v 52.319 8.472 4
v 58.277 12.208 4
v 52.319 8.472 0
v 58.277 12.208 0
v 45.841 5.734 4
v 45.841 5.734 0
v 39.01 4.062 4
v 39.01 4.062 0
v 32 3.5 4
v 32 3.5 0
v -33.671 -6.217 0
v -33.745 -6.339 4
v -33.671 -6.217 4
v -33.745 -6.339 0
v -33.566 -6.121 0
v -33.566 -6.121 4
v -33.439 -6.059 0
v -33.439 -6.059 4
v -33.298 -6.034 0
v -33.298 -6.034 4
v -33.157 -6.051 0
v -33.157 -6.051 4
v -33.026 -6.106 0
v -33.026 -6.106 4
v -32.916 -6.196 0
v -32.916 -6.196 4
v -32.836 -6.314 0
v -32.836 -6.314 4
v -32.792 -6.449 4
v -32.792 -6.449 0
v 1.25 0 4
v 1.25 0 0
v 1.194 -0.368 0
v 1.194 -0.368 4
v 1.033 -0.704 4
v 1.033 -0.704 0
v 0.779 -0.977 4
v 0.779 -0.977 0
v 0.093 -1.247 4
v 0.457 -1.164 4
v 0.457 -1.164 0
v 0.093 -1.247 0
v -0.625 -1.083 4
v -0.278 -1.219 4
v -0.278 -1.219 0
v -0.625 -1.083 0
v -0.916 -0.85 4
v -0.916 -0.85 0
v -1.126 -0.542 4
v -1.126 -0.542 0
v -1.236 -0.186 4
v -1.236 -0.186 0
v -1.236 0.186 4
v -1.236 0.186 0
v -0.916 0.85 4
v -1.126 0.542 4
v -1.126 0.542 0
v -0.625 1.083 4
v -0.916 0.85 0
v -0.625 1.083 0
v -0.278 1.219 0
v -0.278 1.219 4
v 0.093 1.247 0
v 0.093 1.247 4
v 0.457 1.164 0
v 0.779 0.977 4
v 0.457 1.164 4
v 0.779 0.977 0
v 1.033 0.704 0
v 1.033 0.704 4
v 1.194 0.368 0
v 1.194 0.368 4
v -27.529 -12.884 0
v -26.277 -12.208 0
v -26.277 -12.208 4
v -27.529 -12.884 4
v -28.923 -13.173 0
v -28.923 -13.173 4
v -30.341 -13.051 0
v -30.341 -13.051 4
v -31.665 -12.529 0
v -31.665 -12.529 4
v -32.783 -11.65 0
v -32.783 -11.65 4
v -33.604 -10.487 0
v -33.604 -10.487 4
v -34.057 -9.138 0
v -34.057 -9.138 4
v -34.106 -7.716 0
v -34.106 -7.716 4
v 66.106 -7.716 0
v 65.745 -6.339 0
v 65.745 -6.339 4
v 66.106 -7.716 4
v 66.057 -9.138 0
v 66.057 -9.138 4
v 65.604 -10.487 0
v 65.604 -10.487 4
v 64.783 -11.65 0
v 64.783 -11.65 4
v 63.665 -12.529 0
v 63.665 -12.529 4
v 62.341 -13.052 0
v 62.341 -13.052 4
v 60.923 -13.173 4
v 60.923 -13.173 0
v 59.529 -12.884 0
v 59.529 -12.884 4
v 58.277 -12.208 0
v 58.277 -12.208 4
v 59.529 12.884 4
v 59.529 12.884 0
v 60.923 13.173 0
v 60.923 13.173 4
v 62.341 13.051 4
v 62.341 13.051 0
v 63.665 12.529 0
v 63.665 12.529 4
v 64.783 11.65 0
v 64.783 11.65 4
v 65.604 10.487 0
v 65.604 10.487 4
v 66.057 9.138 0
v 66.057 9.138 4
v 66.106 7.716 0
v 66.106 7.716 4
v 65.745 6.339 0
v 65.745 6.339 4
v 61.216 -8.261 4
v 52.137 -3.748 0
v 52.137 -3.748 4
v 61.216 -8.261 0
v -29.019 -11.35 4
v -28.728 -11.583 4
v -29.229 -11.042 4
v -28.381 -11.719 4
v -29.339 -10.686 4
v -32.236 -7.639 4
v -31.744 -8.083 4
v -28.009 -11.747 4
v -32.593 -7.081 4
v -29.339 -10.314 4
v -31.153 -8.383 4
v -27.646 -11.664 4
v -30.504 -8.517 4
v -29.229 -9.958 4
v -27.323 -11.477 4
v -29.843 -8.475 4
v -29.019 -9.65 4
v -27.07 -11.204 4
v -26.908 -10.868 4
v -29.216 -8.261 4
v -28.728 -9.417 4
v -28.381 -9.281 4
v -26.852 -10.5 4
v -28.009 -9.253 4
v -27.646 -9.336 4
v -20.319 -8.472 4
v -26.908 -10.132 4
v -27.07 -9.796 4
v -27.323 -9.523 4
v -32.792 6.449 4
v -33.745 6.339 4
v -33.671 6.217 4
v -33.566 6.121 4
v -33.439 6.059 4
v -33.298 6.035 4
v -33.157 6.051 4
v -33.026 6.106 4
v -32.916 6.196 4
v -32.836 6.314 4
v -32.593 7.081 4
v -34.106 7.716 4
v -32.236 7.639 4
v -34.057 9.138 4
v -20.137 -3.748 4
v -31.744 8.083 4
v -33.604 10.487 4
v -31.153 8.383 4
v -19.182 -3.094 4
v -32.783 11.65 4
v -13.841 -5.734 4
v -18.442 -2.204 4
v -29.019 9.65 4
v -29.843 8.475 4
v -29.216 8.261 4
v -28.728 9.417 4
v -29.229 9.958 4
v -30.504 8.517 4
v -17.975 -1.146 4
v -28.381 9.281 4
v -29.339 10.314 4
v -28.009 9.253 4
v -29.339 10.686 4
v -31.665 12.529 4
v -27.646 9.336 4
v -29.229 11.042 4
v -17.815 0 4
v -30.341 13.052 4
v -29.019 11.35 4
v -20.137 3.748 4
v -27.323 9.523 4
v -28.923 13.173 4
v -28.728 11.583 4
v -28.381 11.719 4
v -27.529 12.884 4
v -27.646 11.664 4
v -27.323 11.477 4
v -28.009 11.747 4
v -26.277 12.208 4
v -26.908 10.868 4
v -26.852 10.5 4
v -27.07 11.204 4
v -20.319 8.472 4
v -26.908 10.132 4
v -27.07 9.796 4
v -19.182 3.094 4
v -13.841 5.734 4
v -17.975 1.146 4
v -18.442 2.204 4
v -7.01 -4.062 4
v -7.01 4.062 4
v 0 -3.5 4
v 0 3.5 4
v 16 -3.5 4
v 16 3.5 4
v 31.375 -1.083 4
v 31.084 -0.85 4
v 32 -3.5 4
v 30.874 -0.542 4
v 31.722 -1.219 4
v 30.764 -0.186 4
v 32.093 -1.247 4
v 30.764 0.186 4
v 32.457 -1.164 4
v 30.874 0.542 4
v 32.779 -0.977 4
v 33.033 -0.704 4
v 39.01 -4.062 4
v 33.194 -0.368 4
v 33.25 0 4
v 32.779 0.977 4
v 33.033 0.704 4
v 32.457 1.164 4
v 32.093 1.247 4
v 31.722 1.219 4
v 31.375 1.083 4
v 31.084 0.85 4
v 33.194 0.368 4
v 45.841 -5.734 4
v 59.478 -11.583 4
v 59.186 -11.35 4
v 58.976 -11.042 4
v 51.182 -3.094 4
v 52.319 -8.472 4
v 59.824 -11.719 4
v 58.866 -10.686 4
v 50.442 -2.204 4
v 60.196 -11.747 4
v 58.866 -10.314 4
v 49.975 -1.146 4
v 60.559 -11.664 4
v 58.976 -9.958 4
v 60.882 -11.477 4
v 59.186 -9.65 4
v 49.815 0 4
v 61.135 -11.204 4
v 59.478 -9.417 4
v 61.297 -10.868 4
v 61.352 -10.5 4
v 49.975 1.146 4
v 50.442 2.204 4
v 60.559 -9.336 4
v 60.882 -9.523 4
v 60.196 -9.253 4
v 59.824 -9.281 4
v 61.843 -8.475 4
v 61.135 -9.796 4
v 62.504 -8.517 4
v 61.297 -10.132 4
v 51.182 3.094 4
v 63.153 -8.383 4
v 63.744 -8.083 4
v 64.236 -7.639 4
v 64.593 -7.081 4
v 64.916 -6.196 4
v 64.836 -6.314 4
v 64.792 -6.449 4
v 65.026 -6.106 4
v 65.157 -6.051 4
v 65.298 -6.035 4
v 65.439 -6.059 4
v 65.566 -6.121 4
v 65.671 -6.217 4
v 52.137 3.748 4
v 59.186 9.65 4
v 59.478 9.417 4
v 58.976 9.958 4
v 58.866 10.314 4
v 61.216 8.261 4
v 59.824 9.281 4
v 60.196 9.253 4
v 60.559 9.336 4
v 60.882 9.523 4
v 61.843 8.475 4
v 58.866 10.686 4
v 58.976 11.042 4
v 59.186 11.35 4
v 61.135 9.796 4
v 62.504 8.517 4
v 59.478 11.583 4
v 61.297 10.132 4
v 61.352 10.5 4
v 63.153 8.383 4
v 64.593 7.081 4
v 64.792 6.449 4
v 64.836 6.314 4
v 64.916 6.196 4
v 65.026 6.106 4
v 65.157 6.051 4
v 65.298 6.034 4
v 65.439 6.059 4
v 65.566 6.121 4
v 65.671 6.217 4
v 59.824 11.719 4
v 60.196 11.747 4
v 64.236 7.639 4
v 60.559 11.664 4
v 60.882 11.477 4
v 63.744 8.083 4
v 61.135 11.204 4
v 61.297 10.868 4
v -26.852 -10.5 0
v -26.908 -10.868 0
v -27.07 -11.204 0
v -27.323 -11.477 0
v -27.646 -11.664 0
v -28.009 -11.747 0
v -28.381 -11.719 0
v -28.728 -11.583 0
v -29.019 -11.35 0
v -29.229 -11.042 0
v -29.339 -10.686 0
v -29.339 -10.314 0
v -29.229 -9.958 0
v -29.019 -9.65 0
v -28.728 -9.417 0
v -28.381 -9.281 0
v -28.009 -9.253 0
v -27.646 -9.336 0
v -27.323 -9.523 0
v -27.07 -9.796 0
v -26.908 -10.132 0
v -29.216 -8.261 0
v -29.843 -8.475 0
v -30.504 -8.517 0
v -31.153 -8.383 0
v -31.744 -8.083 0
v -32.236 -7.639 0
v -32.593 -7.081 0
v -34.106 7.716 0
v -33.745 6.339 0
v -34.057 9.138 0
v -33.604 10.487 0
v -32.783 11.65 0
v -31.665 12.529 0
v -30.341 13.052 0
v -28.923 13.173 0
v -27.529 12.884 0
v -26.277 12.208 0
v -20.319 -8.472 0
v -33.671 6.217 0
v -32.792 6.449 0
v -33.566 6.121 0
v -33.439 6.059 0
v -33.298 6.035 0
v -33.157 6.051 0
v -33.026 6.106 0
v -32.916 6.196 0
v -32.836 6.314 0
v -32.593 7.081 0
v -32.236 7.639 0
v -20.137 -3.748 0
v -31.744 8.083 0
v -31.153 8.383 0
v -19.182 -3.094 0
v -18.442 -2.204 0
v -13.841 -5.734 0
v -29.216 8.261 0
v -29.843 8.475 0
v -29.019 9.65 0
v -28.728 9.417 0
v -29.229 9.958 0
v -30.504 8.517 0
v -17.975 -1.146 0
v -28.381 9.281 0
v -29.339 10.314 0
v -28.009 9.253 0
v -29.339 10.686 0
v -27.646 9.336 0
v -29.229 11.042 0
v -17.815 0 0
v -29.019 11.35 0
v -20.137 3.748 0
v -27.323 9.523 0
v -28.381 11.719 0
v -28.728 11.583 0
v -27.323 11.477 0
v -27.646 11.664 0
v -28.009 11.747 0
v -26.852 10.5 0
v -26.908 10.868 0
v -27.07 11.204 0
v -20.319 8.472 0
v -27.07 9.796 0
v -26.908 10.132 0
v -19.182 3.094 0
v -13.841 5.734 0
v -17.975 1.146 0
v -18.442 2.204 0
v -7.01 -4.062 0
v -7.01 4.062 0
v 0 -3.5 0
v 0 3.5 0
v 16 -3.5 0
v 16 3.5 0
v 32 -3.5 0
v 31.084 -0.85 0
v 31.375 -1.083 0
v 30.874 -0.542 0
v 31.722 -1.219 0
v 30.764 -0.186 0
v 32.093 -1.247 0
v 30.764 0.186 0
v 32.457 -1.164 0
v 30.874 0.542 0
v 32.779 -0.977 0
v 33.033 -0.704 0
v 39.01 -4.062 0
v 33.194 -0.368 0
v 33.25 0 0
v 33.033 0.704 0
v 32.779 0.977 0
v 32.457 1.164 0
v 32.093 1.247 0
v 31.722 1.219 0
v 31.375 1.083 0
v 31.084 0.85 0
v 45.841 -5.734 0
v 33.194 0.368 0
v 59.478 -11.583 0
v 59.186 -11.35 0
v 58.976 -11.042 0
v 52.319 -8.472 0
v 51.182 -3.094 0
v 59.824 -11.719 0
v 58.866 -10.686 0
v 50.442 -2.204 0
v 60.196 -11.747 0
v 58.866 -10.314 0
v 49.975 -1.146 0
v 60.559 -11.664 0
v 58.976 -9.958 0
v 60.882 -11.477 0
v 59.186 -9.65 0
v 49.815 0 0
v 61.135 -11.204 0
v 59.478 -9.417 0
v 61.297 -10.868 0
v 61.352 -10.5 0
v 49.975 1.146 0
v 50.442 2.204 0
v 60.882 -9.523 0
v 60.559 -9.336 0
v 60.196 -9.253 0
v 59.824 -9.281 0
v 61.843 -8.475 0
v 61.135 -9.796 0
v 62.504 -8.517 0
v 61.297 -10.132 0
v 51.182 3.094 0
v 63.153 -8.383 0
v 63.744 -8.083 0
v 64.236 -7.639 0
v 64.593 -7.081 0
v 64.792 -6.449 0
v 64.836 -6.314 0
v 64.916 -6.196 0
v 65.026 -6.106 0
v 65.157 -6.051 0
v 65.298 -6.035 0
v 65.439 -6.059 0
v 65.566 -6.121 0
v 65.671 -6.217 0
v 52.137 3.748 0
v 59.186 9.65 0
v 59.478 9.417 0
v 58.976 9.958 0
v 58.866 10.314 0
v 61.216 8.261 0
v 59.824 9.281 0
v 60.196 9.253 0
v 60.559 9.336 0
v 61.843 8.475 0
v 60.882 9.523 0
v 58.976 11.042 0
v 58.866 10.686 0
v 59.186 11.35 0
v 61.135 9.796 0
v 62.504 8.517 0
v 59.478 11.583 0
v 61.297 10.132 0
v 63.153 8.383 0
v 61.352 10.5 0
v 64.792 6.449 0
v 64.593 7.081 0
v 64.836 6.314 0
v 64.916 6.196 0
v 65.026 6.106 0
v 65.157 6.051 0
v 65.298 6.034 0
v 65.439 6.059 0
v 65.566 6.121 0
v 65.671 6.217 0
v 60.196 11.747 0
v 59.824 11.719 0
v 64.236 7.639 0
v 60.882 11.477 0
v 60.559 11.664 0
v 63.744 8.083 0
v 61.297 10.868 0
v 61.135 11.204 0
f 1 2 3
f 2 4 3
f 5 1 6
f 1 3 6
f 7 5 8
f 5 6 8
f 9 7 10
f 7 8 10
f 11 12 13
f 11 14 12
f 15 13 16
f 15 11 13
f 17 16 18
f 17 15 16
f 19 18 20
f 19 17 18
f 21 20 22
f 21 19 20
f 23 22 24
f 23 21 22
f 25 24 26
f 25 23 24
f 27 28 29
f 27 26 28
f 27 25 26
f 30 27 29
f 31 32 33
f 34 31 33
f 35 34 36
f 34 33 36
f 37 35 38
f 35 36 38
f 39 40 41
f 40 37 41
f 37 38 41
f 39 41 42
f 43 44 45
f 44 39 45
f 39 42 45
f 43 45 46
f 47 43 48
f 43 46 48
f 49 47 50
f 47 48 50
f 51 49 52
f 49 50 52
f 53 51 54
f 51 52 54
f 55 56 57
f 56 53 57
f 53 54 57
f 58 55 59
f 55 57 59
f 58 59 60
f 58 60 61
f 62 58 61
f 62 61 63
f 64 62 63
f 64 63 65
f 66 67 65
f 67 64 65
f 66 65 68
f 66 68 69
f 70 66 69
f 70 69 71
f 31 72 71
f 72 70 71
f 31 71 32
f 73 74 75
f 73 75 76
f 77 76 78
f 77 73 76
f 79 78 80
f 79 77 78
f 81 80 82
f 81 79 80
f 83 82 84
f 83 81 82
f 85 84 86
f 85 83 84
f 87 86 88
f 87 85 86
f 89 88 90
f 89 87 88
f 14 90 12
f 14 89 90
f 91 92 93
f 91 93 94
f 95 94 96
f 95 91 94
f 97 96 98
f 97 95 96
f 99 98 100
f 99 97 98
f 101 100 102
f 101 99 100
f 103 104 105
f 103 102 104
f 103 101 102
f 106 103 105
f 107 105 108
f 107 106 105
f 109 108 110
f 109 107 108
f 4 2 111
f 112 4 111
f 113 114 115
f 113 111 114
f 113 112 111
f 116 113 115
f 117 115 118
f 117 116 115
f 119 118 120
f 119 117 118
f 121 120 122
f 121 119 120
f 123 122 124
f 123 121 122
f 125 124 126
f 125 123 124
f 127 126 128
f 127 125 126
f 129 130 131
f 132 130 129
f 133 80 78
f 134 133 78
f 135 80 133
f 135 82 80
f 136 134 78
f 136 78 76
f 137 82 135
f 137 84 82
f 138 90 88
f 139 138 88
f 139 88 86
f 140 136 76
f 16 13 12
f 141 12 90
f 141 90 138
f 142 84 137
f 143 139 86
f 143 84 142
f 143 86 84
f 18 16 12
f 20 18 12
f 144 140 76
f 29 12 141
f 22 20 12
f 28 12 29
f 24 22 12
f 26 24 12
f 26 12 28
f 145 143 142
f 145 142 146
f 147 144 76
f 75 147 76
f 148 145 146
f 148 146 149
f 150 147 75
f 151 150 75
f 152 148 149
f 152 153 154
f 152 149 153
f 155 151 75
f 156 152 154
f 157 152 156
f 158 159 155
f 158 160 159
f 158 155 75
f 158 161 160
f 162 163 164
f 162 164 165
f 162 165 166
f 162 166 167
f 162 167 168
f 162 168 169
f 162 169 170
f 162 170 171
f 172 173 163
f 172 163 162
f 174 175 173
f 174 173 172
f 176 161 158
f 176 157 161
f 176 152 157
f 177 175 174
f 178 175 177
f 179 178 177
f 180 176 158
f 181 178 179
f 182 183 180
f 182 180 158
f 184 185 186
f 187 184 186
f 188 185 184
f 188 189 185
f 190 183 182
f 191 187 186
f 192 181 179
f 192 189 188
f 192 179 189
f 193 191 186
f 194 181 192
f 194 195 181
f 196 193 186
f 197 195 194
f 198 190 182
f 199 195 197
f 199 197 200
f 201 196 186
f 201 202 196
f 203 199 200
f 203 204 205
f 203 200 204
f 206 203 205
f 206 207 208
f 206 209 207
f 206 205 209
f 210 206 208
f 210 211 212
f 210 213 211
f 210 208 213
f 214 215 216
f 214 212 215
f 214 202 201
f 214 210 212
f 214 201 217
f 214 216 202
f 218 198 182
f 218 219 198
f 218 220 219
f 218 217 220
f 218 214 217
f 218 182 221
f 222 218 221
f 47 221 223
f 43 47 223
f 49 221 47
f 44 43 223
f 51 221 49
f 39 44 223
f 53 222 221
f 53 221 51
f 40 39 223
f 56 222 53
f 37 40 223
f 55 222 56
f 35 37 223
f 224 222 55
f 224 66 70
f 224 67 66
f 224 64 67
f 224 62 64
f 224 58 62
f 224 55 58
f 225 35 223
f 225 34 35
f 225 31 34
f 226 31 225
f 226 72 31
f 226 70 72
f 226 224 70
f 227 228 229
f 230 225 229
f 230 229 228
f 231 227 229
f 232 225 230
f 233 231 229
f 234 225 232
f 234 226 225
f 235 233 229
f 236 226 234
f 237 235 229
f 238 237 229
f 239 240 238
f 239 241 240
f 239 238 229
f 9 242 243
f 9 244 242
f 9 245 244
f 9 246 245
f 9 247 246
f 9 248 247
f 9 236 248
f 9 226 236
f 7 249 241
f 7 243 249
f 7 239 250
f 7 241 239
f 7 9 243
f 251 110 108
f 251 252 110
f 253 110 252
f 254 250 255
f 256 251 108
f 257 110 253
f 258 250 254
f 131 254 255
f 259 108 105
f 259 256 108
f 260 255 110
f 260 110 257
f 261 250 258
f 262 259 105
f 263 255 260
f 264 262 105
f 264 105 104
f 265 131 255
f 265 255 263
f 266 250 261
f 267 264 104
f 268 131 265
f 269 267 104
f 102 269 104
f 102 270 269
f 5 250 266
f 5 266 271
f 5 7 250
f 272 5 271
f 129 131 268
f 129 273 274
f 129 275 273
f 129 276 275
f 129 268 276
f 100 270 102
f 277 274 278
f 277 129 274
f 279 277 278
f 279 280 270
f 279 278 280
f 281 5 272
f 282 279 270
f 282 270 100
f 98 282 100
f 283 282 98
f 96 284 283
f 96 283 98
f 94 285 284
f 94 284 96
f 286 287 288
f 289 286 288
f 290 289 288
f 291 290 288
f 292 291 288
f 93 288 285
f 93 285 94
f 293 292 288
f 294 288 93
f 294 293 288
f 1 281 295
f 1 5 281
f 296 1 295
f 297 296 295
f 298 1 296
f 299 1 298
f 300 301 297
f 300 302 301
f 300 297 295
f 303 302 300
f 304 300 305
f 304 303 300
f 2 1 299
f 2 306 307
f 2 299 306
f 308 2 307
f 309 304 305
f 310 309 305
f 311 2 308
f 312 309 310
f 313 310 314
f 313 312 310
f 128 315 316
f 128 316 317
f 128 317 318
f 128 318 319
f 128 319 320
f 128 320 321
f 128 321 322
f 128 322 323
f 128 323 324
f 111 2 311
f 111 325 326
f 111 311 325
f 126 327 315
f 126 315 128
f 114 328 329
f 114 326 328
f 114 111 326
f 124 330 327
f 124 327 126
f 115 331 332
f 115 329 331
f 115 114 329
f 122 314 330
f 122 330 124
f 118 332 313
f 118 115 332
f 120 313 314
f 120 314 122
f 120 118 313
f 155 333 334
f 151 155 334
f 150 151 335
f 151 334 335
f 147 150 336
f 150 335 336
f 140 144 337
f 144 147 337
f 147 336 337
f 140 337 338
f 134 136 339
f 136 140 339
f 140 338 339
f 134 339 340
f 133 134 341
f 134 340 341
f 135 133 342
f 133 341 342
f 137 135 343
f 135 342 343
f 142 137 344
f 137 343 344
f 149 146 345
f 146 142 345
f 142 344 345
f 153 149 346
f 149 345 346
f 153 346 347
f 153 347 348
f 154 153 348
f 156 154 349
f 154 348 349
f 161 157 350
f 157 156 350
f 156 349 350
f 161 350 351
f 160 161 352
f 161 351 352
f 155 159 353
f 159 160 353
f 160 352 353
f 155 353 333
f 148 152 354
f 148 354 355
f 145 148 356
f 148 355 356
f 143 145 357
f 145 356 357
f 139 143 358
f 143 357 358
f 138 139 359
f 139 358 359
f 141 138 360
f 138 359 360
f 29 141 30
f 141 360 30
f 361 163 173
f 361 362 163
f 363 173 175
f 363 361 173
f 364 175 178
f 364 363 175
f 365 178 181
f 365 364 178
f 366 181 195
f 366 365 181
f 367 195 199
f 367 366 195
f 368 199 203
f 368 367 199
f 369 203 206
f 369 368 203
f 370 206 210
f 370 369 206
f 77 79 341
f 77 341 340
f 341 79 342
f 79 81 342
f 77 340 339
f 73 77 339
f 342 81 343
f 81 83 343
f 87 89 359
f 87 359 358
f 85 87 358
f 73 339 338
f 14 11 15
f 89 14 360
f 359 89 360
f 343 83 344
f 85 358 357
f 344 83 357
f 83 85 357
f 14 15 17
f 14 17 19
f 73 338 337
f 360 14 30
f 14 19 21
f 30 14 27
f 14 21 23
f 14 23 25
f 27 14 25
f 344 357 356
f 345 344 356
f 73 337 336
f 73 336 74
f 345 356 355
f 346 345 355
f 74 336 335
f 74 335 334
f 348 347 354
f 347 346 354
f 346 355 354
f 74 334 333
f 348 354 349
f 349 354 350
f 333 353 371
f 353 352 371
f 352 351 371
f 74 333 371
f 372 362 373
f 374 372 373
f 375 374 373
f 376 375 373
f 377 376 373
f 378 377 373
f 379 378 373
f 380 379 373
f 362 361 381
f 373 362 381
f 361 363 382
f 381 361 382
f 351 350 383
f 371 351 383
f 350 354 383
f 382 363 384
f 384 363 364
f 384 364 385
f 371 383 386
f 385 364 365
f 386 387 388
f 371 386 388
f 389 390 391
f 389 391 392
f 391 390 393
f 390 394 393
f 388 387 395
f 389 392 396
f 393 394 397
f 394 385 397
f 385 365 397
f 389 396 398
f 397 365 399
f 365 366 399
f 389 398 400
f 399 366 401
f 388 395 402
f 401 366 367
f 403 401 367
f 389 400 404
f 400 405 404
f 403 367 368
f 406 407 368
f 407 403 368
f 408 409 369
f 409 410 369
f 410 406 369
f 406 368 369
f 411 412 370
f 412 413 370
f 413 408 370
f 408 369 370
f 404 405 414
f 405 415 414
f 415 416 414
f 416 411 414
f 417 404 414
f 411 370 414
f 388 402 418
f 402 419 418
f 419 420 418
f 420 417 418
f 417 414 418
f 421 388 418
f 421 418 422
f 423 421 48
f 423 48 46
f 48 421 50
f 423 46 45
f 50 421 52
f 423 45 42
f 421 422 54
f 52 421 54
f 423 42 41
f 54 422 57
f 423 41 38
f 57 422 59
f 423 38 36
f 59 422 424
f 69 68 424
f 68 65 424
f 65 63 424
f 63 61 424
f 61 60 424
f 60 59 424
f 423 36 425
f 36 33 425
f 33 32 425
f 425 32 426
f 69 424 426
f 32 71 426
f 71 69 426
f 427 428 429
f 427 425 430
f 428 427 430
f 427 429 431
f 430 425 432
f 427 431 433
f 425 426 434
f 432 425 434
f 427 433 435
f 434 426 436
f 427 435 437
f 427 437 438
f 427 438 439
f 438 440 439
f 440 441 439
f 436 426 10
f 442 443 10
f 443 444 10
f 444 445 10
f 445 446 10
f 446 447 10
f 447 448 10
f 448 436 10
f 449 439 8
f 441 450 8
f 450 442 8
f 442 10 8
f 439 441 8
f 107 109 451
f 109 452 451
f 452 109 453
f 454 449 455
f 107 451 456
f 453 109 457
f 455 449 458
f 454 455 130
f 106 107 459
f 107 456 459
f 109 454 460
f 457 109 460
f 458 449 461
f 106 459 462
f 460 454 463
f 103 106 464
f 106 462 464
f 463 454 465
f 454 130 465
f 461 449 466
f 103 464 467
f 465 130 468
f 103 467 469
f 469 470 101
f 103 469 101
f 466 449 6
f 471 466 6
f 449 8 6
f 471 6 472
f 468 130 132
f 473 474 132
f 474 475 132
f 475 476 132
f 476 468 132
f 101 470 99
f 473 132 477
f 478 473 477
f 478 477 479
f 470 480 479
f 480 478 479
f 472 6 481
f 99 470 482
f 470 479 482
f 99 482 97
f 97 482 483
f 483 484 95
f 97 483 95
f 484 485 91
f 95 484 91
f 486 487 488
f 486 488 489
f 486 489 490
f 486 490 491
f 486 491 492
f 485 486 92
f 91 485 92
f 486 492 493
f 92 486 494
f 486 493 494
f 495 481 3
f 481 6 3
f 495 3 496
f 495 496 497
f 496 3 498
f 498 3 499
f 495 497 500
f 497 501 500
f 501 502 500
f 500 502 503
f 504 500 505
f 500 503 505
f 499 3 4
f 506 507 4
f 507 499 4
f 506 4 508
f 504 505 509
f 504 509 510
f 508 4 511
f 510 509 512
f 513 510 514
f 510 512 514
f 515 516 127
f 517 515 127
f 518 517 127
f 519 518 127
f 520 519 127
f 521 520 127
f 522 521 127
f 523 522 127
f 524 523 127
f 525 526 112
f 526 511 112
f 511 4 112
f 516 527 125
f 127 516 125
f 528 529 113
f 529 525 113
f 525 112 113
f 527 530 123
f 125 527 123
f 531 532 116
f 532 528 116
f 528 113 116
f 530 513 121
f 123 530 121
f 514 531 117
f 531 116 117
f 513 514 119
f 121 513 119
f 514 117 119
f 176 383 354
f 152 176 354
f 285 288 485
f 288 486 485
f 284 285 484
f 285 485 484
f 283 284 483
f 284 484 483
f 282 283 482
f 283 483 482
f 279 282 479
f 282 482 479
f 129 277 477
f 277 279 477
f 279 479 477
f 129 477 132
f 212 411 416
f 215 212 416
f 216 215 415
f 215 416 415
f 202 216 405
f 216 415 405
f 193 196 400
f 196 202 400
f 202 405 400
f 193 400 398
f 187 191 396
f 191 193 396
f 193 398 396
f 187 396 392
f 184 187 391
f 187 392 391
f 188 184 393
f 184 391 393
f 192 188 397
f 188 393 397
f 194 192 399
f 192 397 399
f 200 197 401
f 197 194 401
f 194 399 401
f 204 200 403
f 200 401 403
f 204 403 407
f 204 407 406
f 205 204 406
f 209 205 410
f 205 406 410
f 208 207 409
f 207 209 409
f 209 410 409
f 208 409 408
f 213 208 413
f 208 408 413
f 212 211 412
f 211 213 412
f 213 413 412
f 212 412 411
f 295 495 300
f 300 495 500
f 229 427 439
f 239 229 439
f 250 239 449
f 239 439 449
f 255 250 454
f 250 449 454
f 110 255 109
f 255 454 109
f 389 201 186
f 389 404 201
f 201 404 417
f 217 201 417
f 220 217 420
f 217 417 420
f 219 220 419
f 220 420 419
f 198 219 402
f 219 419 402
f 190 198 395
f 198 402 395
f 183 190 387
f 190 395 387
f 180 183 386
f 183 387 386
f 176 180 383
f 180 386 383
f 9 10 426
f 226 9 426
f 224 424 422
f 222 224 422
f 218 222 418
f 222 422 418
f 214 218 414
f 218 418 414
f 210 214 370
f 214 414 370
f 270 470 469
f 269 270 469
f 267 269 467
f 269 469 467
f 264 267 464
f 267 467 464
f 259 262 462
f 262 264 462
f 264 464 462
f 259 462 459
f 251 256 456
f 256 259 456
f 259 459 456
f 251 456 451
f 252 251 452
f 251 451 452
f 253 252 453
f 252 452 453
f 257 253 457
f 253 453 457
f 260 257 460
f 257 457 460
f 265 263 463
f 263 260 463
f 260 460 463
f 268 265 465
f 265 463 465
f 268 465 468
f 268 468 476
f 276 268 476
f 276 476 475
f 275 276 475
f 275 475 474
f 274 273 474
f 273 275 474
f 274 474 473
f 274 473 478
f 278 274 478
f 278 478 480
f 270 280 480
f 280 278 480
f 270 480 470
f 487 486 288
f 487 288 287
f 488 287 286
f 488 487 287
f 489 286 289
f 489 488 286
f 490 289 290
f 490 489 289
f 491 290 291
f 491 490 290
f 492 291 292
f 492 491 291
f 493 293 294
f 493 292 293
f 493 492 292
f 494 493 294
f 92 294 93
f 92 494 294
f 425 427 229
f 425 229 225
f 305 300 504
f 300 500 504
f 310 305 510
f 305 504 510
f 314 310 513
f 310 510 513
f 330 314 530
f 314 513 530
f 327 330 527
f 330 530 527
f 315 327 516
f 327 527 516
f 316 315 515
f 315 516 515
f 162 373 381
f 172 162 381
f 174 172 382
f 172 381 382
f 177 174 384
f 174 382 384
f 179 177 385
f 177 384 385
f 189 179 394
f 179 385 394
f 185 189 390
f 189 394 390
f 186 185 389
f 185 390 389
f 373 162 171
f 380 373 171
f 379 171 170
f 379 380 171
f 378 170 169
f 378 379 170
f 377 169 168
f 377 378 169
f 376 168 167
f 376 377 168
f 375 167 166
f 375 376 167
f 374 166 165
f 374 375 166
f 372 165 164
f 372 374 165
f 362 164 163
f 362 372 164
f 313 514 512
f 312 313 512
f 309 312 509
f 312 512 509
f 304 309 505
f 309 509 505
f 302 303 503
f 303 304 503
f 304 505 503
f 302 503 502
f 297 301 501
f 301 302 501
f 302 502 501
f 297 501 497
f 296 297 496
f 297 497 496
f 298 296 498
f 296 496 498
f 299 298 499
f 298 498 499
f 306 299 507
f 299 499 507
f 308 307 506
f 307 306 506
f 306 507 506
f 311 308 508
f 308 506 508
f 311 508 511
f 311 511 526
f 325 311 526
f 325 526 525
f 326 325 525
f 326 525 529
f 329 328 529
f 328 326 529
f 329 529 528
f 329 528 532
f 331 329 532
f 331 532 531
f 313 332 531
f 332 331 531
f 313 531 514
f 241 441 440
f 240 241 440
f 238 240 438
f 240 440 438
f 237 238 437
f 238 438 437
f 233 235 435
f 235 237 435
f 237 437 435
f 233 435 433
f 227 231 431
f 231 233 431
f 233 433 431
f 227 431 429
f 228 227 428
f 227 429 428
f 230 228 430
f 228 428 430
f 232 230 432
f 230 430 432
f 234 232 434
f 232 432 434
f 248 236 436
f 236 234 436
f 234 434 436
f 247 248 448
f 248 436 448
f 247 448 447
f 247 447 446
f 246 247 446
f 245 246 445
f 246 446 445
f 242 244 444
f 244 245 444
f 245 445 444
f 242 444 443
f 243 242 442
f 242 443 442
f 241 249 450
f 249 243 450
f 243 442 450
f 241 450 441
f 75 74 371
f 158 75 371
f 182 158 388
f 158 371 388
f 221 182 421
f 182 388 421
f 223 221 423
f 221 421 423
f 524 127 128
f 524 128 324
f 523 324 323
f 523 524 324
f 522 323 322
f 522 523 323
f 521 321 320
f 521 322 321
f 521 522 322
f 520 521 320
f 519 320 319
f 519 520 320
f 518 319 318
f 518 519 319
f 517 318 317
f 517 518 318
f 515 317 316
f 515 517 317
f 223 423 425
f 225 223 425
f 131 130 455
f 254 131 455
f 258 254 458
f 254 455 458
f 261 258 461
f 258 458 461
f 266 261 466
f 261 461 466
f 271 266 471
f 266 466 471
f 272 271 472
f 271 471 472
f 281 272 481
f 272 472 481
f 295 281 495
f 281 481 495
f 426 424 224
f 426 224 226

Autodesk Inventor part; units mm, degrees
ref_plane "YZ Plane" through (0, 0, 0) normal (1, 0, 0) x (0, 1, 0)
ref_plane "XZ Plane" through (0, 0, 0) normal (0, 1, 0) x (-1, 0, 0)
ref_plane "XY Plane" through (0, 0, 0) normal (0, 0, 1) x (1, 0, 0)
sketch "Sketch1" plane through (0, 0, 0) normal (0, 0, 1) x (1, 0, 0)
  circle A0 centre (0, 0) radius 1.25
  circle A1 centre (-28.1025, 10.5) radius 1.25
  circle A2 centre (-28.1025, -10.5) radius 1.25
  line L0 (0, 0) -> (-28.1025, 0) construction
  line L1 (-28.1025, 10.5) -> (0, 0) construction
  line L2 (-28.1025, 0) -> (-28.1025, 10.5) construction
  circle A3 centre (0, 0) radius 2.5 construction
  circle A4 centre (-28.1025, 10.5) radius 2.5 construction
  circle A5 centre (-28.1025, -10.5) radius 2.5 construction
  line L3 (0, 0) -> (0, 7) construction
  line L4 (0, 3.5) -> (16, 3.5)
  arc A6 (-26.277, 12.2081) -> (0, 3.5) centre (0, 47.5) ccw
  line L5 (0, -3.5) -> (16, -3.5)
  line L6 (16, 0) -> (16, 5.5221) construction
  circle A7 centre (32, 0) radius 1.25
  circle A8 centre (60.1025, 10.5) radius 1.25
  circle A9 centre (60.1025, -10.5) radius 1.25
  line L7 (32, 0) -> (60.1025, 0) construction
  line L8 (60.1025, 10.5) -> (32, 0) construction
  line L9 (60.1025, 0) -> (60.1025, 10.5) construction
  circle A10 centre (32, 0) radius 2.5 construction
  circle A11 centre (60.1025, 10.5) radius 2.5 construction
  circle A12 centre (60.1025, -10.5) radius 2.5 construction
  line L10 (32, 0) -> (32, 7) construction
  line L11 (32, 3.5) -> (16, 3.5)
  line L12 (32, -3.5) -> (16, -3.5)
  arc A13 (-20.1367, -3.7476) -> (-20.1367, 3.7476) centre (-22, 0) ccw
  arc A14 (-26.277, 12.2081) -> (-33.7448, 6.3389) centre (-29.2155, 8.2614) ccw
  line L13 (-20.1367, 3.7476) -> (-29.2155, 8.2614)
  arc A15 (-29.2155, 8.2614) -> (-32.7919, 6.449) centre (-30.3285, 6.0228) ccw
  arc A16 (-33.7448, 6.3389) -> (-32.7919, 6.449) centre (-33.2846, 6.5343) ccw
  arc A17 (0, -3.5) -> (-26.277, -12.2081) centre (0, -47.5) ccw
  arc A18 (-33.7448, -6.3389) -> (-26.277, -12.2081) centre (-29.2155, -8.2614) ccw
  line L14 (-20.1367, -3.7476) -> (-29.2155, -8.2614)
  arc A19 (-32.7919, -6.449) -> (-29.2155, -8.2614) centre (-30.3285, -6.0228) ccw
  arc A20 (-32.7919, -6.449) -> (-33.7448, -6.3389) centre (-33.2846, -6.5343) ccw
  arc A21 (32, 3.5) -> (58.277, 12.2081) centre (32, 47.5) ccw
  arc A22 (52.1367, 3.7476) -> (52.1367, -3.7476) centre (54, 0) ccw
  arc A23 (65.7448, 6.3389) -> (58.277, 12.2081) centre (61.2155, 8.2614) ccw
  line L15 (52.1367, 3.7476) -> (61.2155, 8.2614)
  arc A24 (64.7919, 6.449) -> (61.2155, 8.2614) centre (62.3285, 6.0228) ccw
  arc A25 (64.7919, 6.449) -> (65.7448, 6.3389) centre (65.2846, 6.5343) ccw
  arc A26 (58.277, -12.2081) -> (32, -3.5) centre (32, -47.5) ccw
  arc A27 (58.277, -12.2081) -> (65.7448, -6.3389) centre (61.2155, -8.2614) ccw
  arc A28 (61.2155, -8.2614) -> (64.7919, -6.449) centre (62.3285, -6.0228) ccw
  line L16 (52.1367, -3.7476) -> (61.2155, -8.2614)
  arc A29 (65.7448, -6.3389) -> (64.7919, -6.449) centre (65.2846, -6.5343) ccw
  dimension "d0" = 2.5
  dimension "d1" = 10.5
  dimension "d2" = 30
  dimension "d3" = 5
  dimension "d22" = 3.5
  dimension "d27" = 16
  dimension "d32" = 0.5
  dimension "d36" = 22
  dimension "d37" = 2.5
  dimension "d38" = 0.5
  dimension "d45" = 88.205
  dimension "d47" = 44
extrude "Extrusion1" add sketch "Sketch1" along normal blind 4
properties part number "legFrame"
